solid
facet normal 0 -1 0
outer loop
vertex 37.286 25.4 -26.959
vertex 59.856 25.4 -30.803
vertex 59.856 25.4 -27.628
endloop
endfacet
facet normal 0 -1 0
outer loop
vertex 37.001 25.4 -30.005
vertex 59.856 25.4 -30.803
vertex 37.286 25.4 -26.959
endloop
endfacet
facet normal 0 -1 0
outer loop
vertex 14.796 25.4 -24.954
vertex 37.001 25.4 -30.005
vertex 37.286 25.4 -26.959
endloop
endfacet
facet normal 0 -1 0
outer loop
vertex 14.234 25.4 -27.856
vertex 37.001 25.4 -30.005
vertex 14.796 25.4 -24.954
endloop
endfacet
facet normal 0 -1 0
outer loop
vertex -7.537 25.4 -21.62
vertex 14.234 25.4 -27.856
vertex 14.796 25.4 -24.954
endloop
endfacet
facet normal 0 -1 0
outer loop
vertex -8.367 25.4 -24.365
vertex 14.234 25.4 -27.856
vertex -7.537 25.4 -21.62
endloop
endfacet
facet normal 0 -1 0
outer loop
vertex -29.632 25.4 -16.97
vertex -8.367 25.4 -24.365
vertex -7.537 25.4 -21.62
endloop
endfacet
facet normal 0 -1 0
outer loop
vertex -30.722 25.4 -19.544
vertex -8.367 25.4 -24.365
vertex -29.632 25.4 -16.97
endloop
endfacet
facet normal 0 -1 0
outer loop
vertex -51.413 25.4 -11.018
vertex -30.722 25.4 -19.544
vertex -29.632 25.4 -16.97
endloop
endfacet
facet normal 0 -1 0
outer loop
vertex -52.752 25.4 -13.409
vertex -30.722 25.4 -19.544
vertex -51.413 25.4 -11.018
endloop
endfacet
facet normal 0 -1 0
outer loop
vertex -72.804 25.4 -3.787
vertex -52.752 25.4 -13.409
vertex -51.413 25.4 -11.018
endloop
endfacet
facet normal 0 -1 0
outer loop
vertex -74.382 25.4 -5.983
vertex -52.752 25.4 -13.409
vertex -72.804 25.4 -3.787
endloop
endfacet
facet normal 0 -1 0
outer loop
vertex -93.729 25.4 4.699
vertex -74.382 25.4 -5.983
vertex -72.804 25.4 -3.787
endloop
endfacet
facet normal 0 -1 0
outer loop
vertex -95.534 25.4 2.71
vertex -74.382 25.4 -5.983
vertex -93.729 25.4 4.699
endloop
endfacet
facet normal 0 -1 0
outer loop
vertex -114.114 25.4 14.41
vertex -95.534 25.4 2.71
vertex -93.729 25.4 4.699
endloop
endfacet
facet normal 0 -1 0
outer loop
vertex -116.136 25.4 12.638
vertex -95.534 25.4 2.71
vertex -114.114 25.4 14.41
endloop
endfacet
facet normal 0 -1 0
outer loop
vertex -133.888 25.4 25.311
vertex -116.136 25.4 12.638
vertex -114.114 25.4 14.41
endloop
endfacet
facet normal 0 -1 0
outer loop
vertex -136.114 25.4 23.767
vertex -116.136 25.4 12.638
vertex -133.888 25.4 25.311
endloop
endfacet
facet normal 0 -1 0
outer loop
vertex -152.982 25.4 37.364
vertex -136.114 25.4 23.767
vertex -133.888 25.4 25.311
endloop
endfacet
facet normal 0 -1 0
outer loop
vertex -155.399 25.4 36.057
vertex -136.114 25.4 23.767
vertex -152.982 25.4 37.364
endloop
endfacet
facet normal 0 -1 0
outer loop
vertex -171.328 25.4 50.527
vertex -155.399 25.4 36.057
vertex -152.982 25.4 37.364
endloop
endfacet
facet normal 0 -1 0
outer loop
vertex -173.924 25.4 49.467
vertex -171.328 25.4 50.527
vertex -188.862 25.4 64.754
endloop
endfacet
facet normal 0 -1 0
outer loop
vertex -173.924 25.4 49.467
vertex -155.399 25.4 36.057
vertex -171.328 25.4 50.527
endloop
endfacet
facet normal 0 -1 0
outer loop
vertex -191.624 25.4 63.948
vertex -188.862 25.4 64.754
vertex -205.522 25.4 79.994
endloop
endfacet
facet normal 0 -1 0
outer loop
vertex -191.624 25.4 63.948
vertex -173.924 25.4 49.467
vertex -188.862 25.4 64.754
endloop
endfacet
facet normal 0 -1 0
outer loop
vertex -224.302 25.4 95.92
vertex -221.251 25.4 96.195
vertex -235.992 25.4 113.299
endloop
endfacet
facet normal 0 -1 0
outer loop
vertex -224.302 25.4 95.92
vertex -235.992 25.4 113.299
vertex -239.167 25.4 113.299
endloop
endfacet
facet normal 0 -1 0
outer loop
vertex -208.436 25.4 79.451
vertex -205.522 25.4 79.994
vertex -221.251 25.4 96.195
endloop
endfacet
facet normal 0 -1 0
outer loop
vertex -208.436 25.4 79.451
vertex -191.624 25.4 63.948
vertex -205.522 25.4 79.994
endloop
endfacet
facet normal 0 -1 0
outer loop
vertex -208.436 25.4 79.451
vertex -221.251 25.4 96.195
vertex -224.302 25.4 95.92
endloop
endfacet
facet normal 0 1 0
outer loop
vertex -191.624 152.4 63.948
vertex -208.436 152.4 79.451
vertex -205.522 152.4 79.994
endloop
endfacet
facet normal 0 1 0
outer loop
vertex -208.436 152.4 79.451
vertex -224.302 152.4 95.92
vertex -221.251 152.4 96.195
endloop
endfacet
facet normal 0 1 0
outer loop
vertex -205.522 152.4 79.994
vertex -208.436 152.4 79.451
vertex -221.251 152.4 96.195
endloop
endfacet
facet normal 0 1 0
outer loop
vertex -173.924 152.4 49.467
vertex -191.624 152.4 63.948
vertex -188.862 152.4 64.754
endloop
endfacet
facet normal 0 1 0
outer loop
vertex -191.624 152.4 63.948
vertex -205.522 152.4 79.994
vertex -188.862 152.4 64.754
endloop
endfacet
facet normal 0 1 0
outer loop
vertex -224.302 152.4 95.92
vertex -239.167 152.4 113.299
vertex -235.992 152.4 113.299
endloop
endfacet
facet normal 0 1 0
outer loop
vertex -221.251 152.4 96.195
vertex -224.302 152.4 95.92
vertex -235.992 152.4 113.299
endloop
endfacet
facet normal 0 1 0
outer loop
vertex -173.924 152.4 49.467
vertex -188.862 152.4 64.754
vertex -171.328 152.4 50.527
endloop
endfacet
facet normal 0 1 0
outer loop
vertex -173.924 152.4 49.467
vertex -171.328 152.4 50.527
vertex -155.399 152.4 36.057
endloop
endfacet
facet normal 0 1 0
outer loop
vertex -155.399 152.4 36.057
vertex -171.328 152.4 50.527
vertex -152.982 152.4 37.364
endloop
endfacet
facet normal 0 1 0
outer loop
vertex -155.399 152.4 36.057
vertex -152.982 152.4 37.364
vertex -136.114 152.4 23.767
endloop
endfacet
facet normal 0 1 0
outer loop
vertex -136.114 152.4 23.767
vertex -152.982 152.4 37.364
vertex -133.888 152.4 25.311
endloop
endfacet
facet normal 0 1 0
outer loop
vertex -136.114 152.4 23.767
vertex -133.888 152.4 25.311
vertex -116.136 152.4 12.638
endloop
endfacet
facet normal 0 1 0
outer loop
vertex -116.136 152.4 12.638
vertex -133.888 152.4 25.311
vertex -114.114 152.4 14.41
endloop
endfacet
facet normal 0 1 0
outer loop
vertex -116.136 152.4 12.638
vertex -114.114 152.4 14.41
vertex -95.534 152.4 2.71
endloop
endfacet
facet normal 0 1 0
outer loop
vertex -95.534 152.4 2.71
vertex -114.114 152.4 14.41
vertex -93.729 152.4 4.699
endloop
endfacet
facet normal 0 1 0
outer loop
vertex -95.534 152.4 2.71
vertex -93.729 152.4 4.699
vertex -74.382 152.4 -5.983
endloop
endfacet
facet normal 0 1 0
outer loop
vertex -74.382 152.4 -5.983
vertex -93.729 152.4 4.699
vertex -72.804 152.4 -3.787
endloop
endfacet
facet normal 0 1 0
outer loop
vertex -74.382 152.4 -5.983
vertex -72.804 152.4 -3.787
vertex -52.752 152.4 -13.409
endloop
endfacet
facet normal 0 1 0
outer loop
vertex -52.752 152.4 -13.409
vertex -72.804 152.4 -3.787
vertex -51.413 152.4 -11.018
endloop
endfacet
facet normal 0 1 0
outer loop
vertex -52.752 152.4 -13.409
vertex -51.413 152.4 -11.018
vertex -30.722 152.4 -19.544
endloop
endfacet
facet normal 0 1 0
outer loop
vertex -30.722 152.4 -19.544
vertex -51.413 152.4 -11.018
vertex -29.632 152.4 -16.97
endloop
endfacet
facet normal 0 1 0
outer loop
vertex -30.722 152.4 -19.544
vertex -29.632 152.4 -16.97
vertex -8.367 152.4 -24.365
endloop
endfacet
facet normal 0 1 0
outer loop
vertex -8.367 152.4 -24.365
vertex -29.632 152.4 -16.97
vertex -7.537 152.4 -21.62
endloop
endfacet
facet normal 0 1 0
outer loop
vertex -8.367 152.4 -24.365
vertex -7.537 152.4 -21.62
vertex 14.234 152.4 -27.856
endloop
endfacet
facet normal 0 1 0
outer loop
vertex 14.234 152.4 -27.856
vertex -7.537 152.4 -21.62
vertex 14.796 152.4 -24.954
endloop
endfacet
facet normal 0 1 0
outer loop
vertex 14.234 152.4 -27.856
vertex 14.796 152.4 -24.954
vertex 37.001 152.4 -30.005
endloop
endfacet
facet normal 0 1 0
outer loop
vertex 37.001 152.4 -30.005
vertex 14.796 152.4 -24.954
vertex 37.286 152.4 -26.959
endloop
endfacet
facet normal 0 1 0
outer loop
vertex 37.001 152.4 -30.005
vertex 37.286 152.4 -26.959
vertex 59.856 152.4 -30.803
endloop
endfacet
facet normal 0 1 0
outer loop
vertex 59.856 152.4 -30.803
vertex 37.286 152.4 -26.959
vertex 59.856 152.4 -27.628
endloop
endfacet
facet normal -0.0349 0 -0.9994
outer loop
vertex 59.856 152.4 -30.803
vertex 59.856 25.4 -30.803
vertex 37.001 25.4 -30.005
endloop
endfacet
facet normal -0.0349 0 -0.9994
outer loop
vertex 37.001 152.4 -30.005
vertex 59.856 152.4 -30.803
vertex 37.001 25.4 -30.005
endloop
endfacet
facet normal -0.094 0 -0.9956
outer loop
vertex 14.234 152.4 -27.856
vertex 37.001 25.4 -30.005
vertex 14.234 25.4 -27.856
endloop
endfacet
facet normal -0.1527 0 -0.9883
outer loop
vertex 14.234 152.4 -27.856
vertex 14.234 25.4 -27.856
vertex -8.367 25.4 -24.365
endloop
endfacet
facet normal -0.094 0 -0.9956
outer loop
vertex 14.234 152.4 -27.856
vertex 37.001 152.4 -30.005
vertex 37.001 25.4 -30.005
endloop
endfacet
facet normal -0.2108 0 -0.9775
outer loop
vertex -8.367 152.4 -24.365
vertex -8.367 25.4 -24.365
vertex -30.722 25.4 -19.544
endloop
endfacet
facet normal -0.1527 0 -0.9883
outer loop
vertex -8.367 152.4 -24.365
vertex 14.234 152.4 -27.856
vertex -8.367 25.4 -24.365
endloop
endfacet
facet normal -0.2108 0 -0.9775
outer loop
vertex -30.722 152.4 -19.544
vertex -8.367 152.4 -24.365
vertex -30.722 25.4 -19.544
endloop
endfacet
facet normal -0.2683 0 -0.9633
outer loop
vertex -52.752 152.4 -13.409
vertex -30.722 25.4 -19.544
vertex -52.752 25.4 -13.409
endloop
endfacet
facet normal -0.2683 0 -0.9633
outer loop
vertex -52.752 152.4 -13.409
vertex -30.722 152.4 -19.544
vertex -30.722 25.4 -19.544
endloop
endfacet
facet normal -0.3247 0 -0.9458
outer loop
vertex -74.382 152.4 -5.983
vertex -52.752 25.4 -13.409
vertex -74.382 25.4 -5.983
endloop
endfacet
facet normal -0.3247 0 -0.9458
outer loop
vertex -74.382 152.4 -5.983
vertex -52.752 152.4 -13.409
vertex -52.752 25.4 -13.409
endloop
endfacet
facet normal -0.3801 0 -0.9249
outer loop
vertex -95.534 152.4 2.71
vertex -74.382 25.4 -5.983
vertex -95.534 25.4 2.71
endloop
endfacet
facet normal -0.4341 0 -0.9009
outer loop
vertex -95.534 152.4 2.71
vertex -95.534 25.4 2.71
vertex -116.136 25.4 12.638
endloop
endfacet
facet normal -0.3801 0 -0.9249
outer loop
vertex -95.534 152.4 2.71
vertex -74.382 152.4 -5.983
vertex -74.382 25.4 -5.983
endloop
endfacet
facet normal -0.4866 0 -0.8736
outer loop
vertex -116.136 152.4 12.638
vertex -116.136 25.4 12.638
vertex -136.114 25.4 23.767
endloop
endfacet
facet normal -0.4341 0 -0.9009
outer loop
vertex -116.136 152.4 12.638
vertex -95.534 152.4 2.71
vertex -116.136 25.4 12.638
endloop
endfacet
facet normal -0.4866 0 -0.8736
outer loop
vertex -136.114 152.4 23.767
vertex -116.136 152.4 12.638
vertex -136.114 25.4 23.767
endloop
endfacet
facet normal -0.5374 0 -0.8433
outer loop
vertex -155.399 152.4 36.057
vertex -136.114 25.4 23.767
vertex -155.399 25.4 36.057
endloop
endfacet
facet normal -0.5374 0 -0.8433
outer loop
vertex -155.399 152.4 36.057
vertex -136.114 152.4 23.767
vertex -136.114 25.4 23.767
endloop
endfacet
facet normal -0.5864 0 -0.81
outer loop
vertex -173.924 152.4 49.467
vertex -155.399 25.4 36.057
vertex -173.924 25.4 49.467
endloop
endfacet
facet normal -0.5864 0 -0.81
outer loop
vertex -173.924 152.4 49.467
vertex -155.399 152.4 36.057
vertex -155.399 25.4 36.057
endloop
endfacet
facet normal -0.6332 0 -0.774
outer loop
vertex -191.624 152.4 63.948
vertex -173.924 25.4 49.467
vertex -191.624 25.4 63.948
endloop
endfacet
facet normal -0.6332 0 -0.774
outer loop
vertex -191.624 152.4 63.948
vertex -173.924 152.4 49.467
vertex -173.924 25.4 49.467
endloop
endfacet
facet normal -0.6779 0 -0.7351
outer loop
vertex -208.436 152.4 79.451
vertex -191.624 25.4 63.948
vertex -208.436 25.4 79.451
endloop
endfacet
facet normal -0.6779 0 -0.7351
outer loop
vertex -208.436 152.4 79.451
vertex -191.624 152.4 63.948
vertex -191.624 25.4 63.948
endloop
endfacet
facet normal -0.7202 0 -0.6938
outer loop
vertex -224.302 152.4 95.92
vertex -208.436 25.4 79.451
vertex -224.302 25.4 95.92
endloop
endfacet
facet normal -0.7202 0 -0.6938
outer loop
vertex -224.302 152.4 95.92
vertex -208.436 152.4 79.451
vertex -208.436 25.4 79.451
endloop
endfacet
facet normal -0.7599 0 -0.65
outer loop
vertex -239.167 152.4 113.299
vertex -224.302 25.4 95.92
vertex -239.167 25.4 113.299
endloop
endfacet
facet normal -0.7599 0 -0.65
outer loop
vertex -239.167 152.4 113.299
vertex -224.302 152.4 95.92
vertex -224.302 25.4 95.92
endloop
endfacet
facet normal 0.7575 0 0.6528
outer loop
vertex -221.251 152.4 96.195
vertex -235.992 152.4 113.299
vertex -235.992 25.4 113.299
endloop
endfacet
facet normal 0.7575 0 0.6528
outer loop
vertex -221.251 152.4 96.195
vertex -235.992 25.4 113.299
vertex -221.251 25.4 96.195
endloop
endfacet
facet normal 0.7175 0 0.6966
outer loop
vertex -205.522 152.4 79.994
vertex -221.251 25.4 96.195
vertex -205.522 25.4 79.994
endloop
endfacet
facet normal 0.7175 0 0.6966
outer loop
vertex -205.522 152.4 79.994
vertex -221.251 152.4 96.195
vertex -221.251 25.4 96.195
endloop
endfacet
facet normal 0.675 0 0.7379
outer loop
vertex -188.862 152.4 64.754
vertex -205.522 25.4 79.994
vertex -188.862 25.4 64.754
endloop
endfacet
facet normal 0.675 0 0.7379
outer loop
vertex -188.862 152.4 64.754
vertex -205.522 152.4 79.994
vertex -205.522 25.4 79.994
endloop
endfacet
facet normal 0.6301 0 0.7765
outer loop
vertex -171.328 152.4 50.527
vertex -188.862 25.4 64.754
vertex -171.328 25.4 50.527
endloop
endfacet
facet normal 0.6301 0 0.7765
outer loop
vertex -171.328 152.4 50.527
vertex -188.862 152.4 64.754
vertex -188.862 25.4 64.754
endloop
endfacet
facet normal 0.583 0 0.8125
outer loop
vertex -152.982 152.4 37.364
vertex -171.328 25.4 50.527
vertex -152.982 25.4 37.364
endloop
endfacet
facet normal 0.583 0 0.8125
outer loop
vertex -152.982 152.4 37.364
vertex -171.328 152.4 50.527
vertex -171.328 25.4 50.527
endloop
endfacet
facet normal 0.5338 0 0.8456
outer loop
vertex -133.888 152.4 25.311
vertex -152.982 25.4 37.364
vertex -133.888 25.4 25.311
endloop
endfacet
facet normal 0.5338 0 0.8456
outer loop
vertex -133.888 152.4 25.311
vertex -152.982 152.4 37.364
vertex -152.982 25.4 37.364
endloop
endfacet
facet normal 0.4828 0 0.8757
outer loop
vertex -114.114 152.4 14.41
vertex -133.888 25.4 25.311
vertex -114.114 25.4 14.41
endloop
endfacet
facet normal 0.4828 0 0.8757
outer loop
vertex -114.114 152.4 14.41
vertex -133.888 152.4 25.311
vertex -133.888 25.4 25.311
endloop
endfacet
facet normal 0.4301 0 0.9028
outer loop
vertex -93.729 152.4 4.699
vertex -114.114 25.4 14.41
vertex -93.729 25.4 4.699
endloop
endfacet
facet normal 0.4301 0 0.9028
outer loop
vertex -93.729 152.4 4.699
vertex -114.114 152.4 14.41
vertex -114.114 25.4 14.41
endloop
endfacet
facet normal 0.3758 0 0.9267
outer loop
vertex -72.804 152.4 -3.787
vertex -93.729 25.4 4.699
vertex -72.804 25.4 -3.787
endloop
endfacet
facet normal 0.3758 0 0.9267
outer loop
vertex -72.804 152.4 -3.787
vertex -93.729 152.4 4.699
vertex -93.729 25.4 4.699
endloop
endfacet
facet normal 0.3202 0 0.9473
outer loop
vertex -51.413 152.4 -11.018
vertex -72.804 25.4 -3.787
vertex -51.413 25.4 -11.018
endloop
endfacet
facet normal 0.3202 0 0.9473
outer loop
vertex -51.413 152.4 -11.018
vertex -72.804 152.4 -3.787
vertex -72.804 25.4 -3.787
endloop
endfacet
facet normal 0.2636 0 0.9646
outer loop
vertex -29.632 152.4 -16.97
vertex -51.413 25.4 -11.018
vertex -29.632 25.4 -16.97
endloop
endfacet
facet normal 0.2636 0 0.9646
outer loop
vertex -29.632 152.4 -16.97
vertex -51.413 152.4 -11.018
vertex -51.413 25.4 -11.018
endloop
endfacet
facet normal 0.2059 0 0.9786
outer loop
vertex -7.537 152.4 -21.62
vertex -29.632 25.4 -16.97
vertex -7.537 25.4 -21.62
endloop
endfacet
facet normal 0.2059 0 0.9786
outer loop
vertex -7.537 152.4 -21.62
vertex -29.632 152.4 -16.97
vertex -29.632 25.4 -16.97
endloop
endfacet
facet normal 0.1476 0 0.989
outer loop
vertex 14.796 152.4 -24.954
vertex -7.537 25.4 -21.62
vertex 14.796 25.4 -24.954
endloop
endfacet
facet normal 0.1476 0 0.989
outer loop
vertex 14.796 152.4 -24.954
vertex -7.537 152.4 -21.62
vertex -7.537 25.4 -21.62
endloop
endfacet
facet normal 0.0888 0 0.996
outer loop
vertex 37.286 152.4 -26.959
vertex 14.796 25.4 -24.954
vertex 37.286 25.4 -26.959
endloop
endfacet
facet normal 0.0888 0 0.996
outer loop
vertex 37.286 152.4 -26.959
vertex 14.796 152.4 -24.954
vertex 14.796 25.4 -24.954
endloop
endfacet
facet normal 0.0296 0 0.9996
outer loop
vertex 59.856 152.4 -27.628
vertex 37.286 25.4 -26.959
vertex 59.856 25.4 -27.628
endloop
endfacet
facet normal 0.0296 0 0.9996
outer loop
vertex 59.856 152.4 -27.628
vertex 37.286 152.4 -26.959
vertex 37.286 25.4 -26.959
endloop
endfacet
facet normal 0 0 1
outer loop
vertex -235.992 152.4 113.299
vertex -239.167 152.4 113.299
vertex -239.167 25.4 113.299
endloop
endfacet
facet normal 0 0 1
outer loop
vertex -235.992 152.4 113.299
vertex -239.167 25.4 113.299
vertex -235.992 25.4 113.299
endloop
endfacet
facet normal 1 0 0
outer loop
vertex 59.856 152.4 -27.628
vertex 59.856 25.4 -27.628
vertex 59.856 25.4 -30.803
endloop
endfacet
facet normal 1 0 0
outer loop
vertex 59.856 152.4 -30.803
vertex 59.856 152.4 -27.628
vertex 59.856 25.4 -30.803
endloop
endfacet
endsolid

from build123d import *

# Parameters (mm, degrees)
SKETCH3_W           = 609.6
SKETCH3_H           = 304.8
BOSS_EXTRUDE1_DEPTH = 304.8
SKETCH4_W           = 609.6
SKETCH4_H           = 177.8
CUT_EXTRUDE1_DEPTH  = 609.6
SKETCH6_W           = 609.6
SKETCH6_H           = 609.6
CUT_EXTRUDE2_DEPTH  = 254


with BuildPart() as part:
    # Sketch3 → Boss-Extrude1 (new, symmetric)
    with BuildSketch(Plane.XY):
        Rectangle(SKETCH3_W, SKETCH3_H)
    extrude(amount=BOSS_EXTRUDE1_DEPTH, both=True)

    # Sketch4 → Cut-Extrude1 (cut)
    with BuildSketch(Plane(origin=(0, 0, -304.8), x_dir=(-1, 0, 0), z_dir=(0, 0, -1))):
        with Locations((0, -63.5)):
            Rectangle(SKETCH4_W, SKETCH4_H)
    extrude(amount=-CUT_EXTRUDE1_DEPTH, mode=Mode.SUBTRACT)

    # Sketch6 → Cut-Extrude2 (cut)
    with BuildSketch(Plane(origin=(0, 152.4, 0), x_dir=(1, 0, 0), z_dir=(0, 1, 0))):
        Rectangle(SKETCH6_W, SKETCH6_H)
        with BuildLine():
            Line((59.856357946, 27.628202152), (59.856357946, 30.803202152))
            ThreePointArc((59.856357946, 30.803202152), (-105.908299402, -7.521579235), (-239.166769949, -113.299131305))
            Line((-239.166769949, -113.299131305), (-235.991769949, -113.299131305))
            ThreePointArc((-235.991769949, -113.299131305), (-103.99313709, -9.40327752), (59.856357946, 27.628202152))
        make_face(mode=Mode.SUBTRACT)
    extrude(amount=-CUT_EXTRUDE2_DEPTH, mode=Mode.SUBTRACT)


solid = part.part
